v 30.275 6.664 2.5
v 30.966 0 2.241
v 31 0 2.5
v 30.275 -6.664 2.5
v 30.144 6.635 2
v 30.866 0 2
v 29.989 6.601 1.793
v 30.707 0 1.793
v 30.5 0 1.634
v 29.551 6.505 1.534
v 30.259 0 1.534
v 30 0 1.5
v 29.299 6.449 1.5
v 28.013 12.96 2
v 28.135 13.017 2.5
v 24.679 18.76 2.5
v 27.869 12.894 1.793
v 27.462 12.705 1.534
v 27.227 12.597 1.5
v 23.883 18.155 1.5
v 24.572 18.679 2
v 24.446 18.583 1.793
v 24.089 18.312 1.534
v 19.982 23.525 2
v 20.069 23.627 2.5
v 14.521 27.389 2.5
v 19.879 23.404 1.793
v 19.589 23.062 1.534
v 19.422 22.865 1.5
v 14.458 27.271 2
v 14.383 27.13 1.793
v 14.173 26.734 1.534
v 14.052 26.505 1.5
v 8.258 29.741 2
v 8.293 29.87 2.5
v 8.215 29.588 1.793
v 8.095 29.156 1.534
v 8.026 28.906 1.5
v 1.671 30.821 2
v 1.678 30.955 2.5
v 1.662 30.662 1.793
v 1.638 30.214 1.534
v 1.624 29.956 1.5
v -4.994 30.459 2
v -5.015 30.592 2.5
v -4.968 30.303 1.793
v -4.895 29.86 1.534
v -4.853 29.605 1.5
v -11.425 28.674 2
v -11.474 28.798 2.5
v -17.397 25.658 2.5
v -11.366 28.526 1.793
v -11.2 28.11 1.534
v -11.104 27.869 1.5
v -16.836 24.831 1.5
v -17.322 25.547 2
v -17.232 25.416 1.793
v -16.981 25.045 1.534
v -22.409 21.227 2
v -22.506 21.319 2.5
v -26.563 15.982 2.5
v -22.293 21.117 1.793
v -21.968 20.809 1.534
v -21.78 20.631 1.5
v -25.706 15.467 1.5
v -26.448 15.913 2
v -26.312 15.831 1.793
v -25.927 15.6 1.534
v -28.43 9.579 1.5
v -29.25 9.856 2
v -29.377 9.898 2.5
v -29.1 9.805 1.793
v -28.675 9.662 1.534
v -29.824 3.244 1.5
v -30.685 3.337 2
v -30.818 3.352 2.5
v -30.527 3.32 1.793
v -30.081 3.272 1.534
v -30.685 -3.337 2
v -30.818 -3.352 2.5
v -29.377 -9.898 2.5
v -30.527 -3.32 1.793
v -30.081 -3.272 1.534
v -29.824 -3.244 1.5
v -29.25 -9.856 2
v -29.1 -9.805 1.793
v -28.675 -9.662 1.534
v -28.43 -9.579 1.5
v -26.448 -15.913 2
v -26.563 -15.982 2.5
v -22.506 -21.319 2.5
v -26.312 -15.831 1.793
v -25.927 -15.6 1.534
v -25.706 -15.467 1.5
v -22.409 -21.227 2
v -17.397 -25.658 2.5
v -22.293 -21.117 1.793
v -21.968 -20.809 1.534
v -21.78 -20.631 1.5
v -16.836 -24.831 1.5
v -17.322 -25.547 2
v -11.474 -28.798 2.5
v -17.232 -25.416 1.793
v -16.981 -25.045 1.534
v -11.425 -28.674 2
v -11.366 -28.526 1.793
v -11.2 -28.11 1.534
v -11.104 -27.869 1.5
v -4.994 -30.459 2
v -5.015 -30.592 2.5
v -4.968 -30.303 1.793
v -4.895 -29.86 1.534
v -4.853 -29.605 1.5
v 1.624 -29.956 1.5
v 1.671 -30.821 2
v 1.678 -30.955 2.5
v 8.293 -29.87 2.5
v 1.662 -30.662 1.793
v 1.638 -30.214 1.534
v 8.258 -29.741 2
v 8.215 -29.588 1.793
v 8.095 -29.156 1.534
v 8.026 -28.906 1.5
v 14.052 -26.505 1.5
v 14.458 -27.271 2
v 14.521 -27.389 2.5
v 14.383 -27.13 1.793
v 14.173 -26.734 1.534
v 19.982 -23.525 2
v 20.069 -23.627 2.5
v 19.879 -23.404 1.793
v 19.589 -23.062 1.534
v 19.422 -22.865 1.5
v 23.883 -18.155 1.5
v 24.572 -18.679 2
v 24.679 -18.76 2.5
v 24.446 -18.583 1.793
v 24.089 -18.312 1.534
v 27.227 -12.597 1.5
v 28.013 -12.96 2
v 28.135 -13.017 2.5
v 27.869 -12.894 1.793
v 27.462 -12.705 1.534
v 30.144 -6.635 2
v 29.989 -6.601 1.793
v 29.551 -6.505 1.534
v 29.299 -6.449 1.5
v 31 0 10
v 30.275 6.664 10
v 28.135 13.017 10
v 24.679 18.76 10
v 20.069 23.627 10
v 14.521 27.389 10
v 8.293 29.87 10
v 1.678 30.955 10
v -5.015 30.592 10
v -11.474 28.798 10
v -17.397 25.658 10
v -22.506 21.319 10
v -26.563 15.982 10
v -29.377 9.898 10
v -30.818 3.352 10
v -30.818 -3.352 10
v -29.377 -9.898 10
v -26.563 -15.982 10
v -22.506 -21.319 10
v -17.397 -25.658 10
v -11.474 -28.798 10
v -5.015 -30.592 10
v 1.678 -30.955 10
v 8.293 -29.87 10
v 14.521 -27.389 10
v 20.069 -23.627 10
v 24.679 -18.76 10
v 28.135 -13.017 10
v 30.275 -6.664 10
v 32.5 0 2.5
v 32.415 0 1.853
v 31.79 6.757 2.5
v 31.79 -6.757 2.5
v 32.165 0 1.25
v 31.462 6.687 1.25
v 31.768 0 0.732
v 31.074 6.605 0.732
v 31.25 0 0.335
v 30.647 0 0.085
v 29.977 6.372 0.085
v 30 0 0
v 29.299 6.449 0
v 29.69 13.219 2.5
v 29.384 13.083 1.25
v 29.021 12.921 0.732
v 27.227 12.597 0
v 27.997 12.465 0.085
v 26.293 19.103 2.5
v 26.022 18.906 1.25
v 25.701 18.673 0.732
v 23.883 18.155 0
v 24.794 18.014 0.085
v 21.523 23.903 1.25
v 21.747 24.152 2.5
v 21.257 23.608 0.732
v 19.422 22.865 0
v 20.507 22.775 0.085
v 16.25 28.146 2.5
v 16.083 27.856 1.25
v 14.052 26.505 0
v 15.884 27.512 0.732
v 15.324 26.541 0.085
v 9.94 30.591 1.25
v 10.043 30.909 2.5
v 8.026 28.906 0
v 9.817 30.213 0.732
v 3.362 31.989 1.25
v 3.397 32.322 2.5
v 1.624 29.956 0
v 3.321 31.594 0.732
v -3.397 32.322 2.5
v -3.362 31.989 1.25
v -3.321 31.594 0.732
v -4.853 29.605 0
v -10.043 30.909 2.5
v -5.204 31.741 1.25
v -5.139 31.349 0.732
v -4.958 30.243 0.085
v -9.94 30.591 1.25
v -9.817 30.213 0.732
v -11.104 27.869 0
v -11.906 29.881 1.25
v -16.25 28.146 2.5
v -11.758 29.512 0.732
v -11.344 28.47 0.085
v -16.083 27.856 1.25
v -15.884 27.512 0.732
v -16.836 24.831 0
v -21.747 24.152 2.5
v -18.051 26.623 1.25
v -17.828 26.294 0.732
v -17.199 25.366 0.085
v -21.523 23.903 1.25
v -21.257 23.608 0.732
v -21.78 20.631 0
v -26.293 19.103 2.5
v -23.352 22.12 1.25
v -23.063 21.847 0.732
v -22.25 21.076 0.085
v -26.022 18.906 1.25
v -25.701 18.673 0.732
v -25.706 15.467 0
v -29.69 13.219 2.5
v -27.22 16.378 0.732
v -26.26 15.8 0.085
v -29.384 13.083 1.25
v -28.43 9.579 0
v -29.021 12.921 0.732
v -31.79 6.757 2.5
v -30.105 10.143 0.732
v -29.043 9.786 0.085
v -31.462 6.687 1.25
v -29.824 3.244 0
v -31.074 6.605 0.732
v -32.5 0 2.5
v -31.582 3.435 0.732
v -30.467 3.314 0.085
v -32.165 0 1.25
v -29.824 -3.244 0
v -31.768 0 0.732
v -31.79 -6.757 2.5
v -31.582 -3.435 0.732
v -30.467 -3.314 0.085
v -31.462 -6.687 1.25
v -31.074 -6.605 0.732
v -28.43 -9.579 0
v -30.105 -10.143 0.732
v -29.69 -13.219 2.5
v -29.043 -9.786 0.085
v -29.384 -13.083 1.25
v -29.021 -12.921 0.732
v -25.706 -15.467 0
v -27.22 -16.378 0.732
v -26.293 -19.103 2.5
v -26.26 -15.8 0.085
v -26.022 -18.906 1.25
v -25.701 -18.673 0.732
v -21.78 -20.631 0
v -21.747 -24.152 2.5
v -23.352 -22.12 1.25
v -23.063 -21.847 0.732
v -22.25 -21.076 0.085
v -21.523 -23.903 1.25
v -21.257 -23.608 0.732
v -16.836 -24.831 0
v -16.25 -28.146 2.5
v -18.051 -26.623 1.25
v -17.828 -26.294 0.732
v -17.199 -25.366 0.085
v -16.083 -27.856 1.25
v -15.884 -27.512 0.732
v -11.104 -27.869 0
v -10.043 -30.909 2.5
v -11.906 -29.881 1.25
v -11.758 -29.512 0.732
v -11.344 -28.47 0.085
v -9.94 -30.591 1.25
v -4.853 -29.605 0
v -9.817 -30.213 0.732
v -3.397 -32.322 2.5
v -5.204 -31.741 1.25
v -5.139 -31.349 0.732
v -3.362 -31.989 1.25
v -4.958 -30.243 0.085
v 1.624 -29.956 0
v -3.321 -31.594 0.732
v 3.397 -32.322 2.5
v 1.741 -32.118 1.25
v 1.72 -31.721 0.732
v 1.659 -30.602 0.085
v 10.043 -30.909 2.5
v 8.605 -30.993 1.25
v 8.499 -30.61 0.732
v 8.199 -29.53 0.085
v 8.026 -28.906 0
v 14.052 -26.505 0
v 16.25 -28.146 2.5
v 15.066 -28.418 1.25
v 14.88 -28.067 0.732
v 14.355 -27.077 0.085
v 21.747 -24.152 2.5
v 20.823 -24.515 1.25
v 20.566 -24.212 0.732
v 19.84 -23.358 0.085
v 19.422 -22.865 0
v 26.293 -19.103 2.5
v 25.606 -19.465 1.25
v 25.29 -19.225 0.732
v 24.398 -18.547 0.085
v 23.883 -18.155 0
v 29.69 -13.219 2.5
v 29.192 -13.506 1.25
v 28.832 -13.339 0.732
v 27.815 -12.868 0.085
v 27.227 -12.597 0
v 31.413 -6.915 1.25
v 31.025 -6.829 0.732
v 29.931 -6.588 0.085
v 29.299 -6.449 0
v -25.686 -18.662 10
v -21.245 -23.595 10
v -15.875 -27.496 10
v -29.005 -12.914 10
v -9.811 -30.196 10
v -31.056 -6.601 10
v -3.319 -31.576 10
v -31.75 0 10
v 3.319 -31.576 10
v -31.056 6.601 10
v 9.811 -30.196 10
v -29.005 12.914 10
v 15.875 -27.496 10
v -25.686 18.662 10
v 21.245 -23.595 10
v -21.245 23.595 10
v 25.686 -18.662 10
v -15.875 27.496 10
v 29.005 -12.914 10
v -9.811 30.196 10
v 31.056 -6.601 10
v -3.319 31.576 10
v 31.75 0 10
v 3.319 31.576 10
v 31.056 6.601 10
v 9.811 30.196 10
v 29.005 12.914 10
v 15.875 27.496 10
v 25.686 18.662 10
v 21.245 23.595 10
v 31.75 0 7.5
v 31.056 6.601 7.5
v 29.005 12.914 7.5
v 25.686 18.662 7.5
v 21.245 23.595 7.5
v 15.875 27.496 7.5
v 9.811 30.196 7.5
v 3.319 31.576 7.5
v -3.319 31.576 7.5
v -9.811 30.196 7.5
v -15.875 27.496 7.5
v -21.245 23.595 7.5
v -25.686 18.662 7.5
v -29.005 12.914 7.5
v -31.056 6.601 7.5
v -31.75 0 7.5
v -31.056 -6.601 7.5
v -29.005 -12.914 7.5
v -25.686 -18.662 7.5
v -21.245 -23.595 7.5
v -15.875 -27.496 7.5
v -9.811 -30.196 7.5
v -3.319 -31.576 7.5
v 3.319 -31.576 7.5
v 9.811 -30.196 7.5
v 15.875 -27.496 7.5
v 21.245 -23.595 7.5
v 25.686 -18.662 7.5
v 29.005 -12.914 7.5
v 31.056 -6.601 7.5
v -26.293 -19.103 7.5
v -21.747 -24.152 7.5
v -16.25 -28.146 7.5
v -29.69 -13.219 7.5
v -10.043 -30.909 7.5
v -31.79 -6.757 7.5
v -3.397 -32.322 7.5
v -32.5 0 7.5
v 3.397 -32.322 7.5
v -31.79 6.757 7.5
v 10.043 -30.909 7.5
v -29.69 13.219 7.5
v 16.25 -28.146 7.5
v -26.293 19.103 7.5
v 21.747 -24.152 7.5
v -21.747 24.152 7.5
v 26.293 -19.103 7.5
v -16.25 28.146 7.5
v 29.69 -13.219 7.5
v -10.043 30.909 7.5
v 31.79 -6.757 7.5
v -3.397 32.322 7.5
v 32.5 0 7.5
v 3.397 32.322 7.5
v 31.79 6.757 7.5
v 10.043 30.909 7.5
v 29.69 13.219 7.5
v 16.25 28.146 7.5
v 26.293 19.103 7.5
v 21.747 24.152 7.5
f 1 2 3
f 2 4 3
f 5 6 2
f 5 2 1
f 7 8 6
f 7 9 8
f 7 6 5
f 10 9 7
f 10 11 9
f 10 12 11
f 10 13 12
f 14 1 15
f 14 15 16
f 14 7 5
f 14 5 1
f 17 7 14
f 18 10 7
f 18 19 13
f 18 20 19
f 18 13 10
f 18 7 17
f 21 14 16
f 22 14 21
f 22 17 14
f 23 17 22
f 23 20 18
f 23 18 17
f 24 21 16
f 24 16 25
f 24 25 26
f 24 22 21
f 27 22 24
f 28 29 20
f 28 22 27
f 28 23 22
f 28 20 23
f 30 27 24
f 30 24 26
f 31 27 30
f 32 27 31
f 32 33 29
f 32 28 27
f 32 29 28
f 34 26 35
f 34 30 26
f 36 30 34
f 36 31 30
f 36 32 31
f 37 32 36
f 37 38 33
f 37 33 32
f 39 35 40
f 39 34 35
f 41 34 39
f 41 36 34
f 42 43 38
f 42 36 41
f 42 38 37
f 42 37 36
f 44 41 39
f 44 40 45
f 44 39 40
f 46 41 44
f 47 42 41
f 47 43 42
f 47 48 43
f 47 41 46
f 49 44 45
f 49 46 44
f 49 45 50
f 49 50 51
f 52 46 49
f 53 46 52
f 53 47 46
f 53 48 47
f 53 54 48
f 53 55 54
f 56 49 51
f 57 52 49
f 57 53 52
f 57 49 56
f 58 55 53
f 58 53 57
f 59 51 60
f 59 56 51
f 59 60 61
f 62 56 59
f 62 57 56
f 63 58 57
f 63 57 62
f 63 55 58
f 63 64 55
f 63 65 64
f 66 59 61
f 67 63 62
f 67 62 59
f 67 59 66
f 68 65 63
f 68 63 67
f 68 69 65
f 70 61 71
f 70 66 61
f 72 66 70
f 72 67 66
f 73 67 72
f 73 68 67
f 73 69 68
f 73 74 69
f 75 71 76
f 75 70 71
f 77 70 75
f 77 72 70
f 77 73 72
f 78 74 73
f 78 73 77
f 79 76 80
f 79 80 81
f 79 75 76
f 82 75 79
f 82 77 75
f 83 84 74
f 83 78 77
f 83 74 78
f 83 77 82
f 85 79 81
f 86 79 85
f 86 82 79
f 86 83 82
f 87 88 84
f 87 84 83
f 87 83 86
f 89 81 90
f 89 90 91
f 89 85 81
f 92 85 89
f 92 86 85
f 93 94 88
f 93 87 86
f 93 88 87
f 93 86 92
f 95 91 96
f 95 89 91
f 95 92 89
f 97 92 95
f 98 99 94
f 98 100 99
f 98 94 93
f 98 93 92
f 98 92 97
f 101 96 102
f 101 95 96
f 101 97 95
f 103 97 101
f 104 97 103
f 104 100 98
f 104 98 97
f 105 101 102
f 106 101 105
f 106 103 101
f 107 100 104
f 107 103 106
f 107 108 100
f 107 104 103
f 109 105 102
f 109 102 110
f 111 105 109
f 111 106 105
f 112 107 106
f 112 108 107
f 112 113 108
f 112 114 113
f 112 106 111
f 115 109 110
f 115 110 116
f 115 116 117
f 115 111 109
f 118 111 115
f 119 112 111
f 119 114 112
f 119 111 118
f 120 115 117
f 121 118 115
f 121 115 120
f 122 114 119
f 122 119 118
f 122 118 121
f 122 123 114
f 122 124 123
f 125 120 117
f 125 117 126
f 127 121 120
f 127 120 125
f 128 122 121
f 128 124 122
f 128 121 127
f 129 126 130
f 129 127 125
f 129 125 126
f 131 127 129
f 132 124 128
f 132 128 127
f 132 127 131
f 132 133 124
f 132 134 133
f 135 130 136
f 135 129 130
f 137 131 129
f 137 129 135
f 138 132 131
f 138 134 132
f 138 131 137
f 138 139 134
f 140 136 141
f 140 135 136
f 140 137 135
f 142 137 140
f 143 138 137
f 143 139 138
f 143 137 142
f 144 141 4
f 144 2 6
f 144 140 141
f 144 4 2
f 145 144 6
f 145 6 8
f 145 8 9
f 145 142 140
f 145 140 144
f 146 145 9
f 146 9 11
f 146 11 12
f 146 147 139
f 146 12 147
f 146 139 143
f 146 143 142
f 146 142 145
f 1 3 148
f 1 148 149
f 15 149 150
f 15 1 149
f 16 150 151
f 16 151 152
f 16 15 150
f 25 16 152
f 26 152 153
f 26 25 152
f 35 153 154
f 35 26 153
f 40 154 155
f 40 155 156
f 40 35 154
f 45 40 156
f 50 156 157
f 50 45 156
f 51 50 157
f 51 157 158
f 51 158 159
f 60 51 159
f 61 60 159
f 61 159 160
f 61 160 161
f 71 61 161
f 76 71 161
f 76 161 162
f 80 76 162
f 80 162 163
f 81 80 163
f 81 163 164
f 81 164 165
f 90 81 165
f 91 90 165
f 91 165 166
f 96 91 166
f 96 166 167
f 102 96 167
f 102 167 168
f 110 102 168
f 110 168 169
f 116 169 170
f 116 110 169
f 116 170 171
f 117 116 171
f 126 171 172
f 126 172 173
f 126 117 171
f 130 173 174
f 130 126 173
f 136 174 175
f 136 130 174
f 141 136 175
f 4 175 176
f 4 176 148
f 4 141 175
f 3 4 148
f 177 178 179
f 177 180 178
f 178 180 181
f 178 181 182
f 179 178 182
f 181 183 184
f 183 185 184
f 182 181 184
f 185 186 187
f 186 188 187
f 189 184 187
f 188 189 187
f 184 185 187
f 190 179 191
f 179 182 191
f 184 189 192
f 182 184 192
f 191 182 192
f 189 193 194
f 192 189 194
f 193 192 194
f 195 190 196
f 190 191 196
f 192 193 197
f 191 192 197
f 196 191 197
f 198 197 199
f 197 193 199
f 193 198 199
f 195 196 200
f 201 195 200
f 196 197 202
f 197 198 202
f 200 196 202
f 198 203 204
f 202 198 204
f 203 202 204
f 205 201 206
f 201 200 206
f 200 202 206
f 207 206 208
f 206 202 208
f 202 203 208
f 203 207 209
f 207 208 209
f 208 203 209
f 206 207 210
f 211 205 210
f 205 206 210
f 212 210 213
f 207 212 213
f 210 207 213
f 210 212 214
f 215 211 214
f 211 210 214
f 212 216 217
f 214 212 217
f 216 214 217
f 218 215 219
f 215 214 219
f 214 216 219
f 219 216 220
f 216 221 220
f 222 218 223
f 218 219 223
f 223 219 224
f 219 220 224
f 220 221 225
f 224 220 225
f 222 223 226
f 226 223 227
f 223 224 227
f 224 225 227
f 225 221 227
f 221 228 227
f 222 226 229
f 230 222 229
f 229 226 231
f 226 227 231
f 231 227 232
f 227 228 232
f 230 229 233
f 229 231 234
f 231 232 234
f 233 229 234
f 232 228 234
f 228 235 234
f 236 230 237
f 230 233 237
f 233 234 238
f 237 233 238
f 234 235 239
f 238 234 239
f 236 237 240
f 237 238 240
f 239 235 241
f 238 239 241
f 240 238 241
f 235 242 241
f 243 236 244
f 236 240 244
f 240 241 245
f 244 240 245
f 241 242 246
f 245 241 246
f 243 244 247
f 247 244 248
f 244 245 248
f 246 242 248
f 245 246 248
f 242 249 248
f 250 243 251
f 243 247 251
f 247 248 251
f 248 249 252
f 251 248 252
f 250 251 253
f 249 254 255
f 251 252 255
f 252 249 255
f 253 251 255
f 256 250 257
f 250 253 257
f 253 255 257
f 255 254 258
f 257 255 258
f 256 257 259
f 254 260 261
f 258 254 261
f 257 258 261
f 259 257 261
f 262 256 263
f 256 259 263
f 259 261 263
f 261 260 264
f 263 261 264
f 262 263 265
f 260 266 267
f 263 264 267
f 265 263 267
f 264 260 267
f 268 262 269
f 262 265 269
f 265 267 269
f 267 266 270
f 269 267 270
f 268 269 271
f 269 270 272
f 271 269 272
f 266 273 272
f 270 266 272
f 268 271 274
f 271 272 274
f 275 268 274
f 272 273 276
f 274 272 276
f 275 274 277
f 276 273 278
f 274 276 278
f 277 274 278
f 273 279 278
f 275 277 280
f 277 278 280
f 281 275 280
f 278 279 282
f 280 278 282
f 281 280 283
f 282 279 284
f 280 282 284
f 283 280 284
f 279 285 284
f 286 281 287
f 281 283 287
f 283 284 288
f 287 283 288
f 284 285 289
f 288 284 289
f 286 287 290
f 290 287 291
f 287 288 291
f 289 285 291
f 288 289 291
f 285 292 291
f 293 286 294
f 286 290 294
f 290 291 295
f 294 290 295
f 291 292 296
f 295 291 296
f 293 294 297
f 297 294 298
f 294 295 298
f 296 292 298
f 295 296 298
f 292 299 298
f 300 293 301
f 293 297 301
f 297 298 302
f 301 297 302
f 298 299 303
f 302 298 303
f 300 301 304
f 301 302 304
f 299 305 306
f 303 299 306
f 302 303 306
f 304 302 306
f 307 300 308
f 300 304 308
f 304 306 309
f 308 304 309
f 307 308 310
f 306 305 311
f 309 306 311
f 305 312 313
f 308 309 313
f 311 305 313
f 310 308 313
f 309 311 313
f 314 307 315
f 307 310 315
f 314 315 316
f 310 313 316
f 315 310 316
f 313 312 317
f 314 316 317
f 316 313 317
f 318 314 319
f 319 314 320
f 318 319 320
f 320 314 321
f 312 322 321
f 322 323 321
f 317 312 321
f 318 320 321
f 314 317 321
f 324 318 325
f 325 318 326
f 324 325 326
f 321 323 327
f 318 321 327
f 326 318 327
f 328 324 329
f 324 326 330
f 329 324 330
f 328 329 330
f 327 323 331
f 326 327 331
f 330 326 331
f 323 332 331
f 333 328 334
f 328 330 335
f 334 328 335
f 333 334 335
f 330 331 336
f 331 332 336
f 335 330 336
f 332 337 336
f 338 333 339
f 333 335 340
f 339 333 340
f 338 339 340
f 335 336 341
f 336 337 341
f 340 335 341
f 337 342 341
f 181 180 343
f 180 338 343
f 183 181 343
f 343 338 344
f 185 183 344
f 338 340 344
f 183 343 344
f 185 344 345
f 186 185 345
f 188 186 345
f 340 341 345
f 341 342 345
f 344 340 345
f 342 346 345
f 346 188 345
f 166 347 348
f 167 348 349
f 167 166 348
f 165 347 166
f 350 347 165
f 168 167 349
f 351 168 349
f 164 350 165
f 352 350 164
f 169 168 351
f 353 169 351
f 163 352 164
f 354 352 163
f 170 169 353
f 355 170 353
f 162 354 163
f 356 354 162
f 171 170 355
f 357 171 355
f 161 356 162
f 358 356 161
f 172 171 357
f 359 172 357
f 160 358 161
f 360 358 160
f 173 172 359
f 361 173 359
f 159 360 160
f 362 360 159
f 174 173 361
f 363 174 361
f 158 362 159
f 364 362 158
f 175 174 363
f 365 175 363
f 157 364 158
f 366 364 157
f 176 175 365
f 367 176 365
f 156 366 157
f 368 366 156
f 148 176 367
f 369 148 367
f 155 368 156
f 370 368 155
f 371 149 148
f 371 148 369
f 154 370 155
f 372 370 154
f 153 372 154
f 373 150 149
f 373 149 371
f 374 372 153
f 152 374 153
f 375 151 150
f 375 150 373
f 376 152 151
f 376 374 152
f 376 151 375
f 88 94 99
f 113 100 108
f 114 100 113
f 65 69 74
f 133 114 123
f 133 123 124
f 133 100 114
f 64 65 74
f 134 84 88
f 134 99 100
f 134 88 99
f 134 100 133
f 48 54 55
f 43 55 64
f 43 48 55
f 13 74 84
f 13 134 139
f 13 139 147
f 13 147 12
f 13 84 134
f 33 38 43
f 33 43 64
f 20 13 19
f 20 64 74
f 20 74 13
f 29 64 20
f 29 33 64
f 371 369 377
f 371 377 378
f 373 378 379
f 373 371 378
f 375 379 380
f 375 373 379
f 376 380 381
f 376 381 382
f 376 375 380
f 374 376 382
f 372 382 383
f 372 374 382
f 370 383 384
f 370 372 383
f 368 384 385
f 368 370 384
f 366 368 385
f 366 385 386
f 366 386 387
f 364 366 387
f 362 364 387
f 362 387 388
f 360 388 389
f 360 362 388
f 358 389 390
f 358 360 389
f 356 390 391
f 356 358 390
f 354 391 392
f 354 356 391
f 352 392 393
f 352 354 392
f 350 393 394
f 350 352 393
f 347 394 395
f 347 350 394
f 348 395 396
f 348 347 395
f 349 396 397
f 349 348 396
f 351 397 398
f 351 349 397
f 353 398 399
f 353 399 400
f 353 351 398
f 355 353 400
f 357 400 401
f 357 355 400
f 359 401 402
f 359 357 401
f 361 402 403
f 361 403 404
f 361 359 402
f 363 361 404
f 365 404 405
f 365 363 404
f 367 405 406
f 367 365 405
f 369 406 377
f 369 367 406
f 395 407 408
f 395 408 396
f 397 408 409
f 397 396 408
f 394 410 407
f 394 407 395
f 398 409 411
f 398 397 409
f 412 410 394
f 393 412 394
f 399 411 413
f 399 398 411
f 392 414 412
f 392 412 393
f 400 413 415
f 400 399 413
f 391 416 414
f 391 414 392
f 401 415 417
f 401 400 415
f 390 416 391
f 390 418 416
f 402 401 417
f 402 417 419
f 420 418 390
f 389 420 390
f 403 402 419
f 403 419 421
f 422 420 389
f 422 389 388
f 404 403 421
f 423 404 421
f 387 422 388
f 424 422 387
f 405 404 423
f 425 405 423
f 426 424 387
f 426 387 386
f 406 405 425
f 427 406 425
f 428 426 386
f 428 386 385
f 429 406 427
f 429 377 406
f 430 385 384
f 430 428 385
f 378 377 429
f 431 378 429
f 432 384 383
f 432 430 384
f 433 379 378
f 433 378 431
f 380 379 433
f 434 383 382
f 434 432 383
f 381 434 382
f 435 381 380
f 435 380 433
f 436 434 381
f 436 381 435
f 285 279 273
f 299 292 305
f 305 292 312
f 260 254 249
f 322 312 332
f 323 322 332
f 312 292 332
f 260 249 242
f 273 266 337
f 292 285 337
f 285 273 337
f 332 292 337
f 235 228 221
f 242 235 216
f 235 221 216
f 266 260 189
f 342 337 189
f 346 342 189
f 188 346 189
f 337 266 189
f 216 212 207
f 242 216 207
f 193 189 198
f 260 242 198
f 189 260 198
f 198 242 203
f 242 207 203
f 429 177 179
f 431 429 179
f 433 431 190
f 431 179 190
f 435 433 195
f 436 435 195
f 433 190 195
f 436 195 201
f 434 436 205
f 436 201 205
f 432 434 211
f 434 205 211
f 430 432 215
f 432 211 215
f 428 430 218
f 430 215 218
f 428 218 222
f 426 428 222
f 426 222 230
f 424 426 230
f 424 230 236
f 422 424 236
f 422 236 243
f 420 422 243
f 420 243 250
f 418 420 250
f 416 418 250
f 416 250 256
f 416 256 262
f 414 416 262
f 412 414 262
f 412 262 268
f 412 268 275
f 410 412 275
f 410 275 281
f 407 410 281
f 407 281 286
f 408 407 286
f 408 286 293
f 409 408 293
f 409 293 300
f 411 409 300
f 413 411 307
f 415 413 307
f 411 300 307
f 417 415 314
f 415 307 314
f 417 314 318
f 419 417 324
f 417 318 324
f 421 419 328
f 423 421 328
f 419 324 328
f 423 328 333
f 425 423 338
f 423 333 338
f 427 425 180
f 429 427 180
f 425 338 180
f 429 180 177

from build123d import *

# Parameters (mm, degrees)
F0_R     = 32.5
F1_DEPTH = 10
F2_R     = 2.5
F3_T     = -1.5
F4_R     = 32.5
F4_R_2   = 31.75
F5_DEPTH = 2.5


# Not quite as in the source:
# - a feature names something its author has since deleted; it is built from what else it names


with BuildPart() as f1:
    # F0 (on Top) → F1 (new body)
    with BuildSketch(Plane.XY):
        Circle(F0_R)
    extrude(amount=F1_DEPTH)

    # F2
    f2_edges = [f1.edges().sort_by_distance(p)[0] for p in [
        (-32.5, 0, 0),
    ]]
    fillet(f2_edges, radius=F2_R)

    # F3
    f3_openings = [f1.faces().sort_by_distance(p)[0] for p in [
        (0, 0, 10),
    ]]
    offset(amount=F3_T, openings=f3_openings)

    # F4 (on face) → F5 (cut)
    with BuildSketch(Plane.XY.offset(10)):
        Circle(F4_R)
        Circle(F4_R_2, mode=Mode.SUBTRACT)
    extrude(amount=-F5_DEPTH, mode=Mode.SUBTRACT)


solid = f1.part
